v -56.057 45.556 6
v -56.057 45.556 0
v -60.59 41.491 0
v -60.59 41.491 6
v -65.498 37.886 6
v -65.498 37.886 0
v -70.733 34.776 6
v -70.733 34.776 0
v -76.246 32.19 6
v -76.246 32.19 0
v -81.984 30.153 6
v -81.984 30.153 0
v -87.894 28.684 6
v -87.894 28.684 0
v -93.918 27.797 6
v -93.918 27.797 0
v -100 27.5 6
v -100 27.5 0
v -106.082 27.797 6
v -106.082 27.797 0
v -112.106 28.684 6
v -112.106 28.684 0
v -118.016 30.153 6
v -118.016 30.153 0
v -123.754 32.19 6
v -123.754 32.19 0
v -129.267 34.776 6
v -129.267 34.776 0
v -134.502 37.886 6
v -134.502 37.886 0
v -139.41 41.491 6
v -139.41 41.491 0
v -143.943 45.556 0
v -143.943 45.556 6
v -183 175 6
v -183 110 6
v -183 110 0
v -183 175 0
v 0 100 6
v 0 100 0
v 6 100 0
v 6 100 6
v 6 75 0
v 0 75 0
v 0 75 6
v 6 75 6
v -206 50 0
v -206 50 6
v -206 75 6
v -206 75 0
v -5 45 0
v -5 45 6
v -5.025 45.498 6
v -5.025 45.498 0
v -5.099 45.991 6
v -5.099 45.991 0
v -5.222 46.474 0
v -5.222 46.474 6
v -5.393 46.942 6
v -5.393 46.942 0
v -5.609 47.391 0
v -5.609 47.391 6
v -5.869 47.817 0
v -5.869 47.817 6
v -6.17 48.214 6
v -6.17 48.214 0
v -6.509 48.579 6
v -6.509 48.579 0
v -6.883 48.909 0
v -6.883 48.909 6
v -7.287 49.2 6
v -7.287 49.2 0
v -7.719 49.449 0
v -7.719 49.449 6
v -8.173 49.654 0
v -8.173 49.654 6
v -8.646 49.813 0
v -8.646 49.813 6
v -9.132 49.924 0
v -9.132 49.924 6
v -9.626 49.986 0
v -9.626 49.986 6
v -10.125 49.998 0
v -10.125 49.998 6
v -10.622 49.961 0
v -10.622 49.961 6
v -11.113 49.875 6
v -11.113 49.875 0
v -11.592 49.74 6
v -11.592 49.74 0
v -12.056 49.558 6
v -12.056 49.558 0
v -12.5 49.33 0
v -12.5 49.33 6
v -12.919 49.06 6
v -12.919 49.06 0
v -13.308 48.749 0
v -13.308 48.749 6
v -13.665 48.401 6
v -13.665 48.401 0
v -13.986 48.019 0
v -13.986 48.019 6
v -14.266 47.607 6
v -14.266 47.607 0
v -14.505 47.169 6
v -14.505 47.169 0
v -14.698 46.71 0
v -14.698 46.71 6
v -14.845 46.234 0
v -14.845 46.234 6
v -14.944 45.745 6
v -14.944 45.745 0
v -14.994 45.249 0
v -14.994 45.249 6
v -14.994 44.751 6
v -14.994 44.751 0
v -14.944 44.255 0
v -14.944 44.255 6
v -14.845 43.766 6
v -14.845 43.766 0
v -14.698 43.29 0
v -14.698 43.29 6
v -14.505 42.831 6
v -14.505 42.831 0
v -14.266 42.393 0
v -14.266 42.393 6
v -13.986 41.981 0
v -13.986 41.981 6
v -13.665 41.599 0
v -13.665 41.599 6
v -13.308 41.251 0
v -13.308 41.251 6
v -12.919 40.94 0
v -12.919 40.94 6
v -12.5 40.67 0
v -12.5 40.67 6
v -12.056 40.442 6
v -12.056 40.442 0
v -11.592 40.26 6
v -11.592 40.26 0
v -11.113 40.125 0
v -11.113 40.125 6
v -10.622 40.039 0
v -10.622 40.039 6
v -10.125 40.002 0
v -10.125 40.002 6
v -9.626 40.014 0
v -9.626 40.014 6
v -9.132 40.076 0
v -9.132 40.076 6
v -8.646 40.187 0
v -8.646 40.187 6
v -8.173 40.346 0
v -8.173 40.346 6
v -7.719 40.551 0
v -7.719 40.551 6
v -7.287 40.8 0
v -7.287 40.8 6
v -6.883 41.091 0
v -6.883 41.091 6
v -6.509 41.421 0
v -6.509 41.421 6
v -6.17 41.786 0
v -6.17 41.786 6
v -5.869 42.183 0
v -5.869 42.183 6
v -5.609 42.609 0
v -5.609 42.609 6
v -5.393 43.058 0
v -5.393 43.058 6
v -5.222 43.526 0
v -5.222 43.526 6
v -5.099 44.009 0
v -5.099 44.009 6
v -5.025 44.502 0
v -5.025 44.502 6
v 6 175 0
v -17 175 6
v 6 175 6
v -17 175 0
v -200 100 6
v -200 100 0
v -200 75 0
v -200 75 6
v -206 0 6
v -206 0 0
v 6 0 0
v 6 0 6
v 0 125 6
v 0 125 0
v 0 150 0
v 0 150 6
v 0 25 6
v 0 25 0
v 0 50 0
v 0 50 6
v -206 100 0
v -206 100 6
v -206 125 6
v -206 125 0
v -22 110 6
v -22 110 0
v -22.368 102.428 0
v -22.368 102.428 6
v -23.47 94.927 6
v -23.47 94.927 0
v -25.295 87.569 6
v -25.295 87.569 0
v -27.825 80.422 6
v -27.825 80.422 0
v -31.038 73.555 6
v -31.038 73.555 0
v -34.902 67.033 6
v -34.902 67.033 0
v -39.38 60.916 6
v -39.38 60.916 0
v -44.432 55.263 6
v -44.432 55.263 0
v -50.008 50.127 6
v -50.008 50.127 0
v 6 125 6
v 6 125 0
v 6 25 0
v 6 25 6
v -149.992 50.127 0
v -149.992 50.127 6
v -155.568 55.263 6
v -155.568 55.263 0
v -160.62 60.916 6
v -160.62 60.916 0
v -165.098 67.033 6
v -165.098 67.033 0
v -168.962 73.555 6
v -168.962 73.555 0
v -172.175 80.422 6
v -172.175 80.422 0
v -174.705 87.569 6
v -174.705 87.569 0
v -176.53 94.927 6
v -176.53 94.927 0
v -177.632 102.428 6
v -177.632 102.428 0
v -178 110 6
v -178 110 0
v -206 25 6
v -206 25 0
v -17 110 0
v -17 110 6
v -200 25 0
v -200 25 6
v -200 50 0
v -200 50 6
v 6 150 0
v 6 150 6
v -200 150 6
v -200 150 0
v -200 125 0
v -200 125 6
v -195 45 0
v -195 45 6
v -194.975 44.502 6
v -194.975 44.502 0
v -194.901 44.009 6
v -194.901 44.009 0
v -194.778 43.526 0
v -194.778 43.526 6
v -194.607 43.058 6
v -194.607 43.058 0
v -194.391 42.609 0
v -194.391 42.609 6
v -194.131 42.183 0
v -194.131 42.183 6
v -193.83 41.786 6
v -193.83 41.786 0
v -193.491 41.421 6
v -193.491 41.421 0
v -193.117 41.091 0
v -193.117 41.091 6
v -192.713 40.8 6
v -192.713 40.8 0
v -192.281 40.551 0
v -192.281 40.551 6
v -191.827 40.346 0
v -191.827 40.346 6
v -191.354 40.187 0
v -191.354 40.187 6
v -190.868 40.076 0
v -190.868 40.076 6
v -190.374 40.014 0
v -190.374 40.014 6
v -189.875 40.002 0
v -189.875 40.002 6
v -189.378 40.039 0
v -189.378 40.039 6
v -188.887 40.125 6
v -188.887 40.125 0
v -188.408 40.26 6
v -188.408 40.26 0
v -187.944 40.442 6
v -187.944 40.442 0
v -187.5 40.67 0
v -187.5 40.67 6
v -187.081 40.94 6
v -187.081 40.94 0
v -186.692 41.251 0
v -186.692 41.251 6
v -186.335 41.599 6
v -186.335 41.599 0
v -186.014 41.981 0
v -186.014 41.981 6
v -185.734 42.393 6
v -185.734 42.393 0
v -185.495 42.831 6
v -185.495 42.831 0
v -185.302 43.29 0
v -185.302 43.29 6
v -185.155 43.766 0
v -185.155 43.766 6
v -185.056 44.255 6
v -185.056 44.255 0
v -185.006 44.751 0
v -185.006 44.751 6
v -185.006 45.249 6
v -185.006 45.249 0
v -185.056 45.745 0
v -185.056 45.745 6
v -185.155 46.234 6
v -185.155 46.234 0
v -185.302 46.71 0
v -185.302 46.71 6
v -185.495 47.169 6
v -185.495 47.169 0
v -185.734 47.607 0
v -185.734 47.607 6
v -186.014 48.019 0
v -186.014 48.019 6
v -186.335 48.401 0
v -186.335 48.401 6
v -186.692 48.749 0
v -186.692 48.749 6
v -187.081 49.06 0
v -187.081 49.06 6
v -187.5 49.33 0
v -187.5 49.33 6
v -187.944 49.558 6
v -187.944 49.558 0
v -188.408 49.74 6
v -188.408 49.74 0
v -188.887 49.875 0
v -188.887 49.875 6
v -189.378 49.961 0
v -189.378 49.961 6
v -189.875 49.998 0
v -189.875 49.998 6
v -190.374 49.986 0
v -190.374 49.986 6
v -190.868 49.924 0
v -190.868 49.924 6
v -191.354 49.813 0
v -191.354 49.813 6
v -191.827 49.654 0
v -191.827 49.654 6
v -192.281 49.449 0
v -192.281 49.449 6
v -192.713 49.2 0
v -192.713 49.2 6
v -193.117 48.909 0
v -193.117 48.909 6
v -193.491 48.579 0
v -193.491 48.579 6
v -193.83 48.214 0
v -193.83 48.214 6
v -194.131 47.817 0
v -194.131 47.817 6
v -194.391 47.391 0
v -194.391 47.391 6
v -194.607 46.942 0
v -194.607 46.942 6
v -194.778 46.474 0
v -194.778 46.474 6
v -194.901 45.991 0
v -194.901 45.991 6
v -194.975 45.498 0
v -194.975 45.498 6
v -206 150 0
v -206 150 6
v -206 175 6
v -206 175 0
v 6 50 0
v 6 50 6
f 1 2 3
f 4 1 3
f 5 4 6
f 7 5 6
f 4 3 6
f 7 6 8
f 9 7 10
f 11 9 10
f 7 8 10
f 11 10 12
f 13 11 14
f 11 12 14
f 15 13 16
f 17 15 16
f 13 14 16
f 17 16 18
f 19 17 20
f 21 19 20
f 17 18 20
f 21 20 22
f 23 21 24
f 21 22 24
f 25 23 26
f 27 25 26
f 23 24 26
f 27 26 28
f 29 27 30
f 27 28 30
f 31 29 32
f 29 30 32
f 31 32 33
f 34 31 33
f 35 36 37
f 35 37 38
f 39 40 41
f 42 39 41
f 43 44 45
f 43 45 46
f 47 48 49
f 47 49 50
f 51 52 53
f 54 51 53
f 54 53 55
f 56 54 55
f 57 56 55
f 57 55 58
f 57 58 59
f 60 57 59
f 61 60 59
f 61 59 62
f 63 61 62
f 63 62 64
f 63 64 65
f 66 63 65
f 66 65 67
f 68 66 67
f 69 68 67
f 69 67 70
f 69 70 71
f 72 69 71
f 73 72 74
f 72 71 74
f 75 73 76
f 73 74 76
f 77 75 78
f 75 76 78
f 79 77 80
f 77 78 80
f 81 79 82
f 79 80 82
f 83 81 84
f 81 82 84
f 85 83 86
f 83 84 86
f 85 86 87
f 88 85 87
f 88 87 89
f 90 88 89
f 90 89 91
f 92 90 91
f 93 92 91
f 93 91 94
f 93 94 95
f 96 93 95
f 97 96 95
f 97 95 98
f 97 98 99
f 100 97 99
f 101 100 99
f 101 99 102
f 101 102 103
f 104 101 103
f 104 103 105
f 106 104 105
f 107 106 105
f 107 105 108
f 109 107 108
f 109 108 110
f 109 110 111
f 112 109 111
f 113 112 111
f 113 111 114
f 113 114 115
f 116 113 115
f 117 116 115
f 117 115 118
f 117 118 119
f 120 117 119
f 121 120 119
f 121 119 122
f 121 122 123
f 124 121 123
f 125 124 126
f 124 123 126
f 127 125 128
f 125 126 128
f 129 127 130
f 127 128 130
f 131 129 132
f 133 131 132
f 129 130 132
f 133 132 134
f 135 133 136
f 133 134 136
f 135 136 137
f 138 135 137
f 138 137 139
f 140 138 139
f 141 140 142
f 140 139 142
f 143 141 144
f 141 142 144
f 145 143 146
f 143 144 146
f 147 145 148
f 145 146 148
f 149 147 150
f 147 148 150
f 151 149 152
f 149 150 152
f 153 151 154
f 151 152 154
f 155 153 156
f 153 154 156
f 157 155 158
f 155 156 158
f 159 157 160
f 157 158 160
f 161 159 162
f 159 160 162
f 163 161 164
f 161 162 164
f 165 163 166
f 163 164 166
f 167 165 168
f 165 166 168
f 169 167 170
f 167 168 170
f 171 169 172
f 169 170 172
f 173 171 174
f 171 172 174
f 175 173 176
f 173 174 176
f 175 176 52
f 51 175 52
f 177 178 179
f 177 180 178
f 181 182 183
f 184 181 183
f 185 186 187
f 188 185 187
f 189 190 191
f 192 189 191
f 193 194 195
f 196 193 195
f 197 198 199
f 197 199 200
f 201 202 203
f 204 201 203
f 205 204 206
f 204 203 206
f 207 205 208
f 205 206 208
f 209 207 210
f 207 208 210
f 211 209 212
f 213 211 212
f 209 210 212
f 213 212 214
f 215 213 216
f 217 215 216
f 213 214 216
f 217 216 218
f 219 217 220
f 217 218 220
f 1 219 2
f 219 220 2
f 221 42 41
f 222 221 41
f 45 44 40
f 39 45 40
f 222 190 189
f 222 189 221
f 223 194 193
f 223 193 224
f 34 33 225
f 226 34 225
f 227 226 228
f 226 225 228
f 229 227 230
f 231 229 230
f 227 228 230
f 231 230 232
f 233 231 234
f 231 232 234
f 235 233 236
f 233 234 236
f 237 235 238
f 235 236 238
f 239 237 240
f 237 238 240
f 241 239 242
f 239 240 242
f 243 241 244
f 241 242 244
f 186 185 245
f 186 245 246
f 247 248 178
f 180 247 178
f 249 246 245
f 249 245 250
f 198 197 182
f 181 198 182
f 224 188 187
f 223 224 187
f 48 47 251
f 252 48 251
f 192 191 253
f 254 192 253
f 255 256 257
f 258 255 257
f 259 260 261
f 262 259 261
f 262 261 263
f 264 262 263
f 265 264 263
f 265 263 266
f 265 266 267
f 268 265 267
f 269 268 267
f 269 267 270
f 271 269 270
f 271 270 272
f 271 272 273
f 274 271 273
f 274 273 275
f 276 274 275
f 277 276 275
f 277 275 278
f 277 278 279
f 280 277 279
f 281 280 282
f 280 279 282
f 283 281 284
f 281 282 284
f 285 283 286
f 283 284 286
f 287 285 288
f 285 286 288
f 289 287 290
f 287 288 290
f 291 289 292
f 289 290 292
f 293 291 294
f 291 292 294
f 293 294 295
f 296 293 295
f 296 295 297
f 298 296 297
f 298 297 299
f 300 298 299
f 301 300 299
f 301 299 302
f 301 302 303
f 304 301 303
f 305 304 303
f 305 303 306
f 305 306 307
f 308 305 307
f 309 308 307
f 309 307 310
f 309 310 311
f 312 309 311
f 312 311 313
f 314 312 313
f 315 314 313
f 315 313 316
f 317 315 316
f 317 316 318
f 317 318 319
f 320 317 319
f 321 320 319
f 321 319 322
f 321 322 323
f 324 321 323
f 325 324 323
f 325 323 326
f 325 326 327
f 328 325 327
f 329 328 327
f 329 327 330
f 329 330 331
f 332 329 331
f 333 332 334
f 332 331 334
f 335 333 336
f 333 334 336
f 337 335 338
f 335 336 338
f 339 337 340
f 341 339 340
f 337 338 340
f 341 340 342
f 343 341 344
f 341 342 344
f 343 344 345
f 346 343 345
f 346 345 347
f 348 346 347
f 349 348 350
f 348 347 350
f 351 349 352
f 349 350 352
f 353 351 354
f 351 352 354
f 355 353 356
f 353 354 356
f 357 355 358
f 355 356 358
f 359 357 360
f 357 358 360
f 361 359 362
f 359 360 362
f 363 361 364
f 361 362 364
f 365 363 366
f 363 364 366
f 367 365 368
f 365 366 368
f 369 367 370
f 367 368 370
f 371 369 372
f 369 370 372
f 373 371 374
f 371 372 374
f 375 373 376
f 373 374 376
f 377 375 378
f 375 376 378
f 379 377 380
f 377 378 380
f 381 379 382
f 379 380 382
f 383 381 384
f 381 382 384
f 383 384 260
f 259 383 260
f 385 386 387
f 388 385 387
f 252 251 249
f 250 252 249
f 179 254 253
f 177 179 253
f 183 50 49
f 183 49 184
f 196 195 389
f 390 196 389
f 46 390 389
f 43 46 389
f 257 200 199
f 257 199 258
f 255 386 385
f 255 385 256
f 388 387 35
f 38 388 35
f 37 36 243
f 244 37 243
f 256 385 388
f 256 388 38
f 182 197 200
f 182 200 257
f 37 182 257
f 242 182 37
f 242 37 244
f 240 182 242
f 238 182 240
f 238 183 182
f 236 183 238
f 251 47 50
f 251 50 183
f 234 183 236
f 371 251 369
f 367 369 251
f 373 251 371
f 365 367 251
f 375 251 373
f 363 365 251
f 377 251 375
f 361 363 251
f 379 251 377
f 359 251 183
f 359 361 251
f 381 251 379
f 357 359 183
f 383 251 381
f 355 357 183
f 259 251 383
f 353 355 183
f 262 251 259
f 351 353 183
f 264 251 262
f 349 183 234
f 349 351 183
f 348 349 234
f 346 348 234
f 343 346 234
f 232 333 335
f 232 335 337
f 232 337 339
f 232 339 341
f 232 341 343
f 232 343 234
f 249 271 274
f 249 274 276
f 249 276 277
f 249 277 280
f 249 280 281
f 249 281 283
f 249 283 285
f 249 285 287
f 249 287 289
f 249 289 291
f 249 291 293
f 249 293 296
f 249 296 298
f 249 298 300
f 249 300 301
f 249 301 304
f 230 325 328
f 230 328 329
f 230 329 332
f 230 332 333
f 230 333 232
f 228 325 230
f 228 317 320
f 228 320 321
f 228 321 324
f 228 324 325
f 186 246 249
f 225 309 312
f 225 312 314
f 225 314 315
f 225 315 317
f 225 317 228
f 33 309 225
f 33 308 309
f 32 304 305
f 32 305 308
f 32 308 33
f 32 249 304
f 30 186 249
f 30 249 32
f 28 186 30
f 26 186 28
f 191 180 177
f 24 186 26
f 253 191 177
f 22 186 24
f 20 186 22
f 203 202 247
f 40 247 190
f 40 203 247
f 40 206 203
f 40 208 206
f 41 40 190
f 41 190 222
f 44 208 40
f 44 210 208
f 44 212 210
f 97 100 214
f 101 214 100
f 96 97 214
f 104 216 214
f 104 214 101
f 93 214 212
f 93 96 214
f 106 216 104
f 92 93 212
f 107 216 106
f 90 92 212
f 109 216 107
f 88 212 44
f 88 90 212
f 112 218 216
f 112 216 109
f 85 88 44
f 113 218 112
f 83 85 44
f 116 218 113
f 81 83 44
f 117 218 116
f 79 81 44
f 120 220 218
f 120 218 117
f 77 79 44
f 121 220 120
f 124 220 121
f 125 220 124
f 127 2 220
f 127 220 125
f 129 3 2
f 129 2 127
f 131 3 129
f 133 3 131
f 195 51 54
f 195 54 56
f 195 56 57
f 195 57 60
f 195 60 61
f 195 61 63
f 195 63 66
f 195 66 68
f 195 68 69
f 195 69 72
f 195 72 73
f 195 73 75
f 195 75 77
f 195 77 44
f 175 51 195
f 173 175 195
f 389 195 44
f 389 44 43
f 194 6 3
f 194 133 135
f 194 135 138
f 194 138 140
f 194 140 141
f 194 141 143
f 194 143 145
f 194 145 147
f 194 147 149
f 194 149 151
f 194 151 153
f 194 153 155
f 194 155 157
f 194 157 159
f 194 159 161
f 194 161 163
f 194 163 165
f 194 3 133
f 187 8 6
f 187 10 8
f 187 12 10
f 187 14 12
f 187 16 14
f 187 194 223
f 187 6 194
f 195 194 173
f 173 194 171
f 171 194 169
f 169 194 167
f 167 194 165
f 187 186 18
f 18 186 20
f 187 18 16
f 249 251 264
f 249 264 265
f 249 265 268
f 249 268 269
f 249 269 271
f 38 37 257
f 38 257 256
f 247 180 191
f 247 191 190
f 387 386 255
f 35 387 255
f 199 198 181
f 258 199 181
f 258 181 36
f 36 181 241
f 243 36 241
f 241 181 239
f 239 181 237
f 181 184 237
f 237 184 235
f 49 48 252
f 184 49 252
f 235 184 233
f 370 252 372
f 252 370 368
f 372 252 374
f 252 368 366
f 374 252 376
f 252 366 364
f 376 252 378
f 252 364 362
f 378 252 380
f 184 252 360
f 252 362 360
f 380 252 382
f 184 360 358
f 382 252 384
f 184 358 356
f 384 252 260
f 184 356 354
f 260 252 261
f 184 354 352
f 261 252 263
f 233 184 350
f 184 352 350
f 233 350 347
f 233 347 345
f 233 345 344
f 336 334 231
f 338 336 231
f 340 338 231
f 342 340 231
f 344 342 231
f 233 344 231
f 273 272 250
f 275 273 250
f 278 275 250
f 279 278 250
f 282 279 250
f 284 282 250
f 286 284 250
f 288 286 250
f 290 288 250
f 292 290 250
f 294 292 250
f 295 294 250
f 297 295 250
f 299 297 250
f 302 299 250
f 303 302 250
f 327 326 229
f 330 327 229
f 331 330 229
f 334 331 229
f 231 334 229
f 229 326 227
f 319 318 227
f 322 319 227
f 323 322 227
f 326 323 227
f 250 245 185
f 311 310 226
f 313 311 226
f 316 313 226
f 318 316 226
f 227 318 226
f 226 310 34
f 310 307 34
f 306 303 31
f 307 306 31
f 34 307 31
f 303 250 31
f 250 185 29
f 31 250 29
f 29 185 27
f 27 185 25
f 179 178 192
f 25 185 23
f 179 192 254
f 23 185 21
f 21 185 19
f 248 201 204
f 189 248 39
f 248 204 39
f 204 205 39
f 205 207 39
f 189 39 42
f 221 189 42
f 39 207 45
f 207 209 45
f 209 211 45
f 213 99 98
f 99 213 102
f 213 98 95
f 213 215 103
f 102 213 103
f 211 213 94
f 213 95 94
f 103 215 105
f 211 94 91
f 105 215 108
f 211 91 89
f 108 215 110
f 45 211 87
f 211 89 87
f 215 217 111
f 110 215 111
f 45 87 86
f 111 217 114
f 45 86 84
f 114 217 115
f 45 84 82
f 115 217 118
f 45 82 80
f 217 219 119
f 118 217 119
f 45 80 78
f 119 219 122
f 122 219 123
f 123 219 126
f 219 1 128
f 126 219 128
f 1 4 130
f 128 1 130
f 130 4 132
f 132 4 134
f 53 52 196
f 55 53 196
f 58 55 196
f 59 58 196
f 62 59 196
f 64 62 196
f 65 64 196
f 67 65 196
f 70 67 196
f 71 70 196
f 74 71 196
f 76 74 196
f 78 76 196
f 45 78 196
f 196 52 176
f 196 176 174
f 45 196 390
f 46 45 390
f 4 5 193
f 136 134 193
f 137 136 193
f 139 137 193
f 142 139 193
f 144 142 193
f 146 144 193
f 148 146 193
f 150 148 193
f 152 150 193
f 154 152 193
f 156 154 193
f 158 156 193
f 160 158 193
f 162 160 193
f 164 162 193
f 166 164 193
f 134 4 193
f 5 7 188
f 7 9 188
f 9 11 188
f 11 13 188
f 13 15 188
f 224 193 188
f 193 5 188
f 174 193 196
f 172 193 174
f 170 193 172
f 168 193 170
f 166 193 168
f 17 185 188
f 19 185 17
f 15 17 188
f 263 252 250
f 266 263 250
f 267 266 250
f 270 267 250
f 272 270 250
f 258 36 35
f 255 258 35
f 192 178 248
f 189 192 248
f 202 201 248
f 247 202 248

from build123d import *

# Parameters (mm, degrees)
BOSS_EXTRUDE1_DEPTH   = 6
SKETCH2_W             = 6
SKETCH2_H             = 25
BOSS_EXTRUDE2_DEPTH   = 6
LPATTERN1_OUTLINE_W   = 6
LPATTERN1_OUTLINE_H   = 6
LPATTERN1_DEPTH       = 25
LPATTERN1_START       = 50
LPATTERN1_2_OUTLINE_W = 6
LPATTERN1_2_OUTLINE_H = 6
LPATTERN1_2_DEPTH     = 25
LPATTERN1_START_2     = 100
LPATTERN1_3_OUTLINE_W = 6
LPATTERN1_3_OUTLINE_H = 6
LPATTERN1_3_DEPTH     = 25
LPATTERN1_START_3     = 150
LPATTERN1_4_OUTLINE_W = 6
LPATTERN1_4_OUTLINE_H = 6
LPATTERN1_4_DEPTH     = 25
SKETCH5_R             = 5
CUT_EXTRUDE1_DEPTH    = 271.364568685
SKETCH6_W             = 5
SKETCH6_H             = 65
CUT_EXTRUDE2_DEPTH    = 10


# Read off the part's stored shape, not the designer's step: LPattern1
with BuildPart() as part:
    # Sketch1 → Boss-Extrude1 (new body)
    with BuildSketch(Plane.XY):
        with BuildLine():
            Line((-178, 175), (-200, 175))
            Line((-200, 175), (-200, 0))
            Line((-200, 0), (0, 0))
            Line((0, 0), (0, 175))
            Line((0, 175), (-22, 175))
            Line((-22, 175), (-22, 110))
            ThreePointArc((-22, 110), (-31.037807258, 73.555302549), (-56.056819802, 45.55625))
            ThreePointArc((-56.056819802, 45.55625), (-100, 27.5), (-143.943180198, 45.55625))
            ThreePointArc((-143.943180198, 45.55625), (-168.962192742, 73.555302549), (-178, 110))
            Line((-178, 110), (-178, 175))
        make_face()
    extrude(amount=BOSS_EXTRUDE1_DEPTH)

    # Sketch2 → Boss-Extrude2 (add)
    with BuildSketch(Plane.XY.offset(6)):
        with Locations((-203, 162.5)):
            Rectangle(SKETCH2_W, SKETCH2_H)
    extrude(amount=-BOSS_EXTRUDE2_DEPTH)

    # LPattern1 outline → LPattern1 (add)
    with BuildSketch(Plane(origin=(0, 0, 0), x_dir=(1, 0, 0), z_dir=(0, 1, 0))):
        with Locations((-203, -3)):
            Rectangle(LPATTERN1_OUTLINE_W, LPATTERN1_OUTLINE_H)
        with Locations((3, -3)):
            Rectangle(LPATTERN1_OUTLINE_W, LPATTERN1_OUTLINE_H)
    extrude(amount=LPATTERN1_DEPTH)

    # LPattern1 2 outline → LPattern1 2 (add)
    with BuildSketch(Plane(origin=(0, 0, 0), x_dir=(1, 0, 0), z_dir=(0, 1, 0)).offset(LPATTERN1_START)):
        with Locations((-203, -3)):
            Rectangle(LPATTERN1_2_OUTLINE_W, LPATTERN1_2_OUTLINE_H)
        with Locations((3, -3)):
            Rectangle(LPATTERN1_2_OUTLINE_W, LPATTERN1_2_OUTLINE_H)
    extrude(amount=LPATTERN1_2_DEPTH)

    # LPattern1 3 outline → LPattern1 3 (add)
    with BuildSketch(Plane(origin=(0, 0, 0), x_dir=(1, 0, 0), z_dir=(0, 1, 0)).offset(LPATTERN1_START_2)):
        with Locations((-203, -3)):
            Rectangle(LPATTERN1_3_OUTLINE_W, LPATTERN1_3_OUTLINE_H)
        with Locations((3, -3)):
            Rectangle(LPATTERN1_3_OUTLINE_W, LPATTERN1_3_OUTLINE_H)
    extrude(amount=LPATTERN1_3_DEPTH)

    # LPattern1 4 outline → LPattern1 4 (add)
    with BuildSketch(Plane(origin=(0, 0, 0), x_dir=(1, 0, 0), z_dir=(0, 1, 0)).offset(LPATTERN1_START_3)):
        with Locations((3, -3)):
            Rectangle(LPATTERN1_4_OUTLINE_W, LPATTERN1_4_OUTLINE_H)
    extrude(amount=LPATTERN1_4_DEPTH)

    # Sketch5 → Cut-Extrude1 (cut, through all)
    with BuildSketch(Plane.XY.offset(6)):
        with Locations((-10, 45)):
            Circle(SKETCH5_R)
        with Locations(Location((-190, 45, 0), (0, 0, 180))):
            Circle(SKETCH5_R)
    extrude(amount=-CUT_EXTRUDE1_DEPTH, mode=Mode.SUBTRACT)

    # Sketch6 → Cut-Extrude2 (cut)
    with BuildSketch(Plane.XY.offset(6)):
        with Locations((-180.5, 142.5)):
            Rectangle(SKETCH6_W, SKETCH6_H)
        with Locations((-19.5, 142.5)):
            Rectangle(SKETCH6_W, SKETCH6_H)
    extrude(amount=-CUT_EXTRUDE2_DEPTH, mode=Mode.SUBTRACT)


solid = part.part
